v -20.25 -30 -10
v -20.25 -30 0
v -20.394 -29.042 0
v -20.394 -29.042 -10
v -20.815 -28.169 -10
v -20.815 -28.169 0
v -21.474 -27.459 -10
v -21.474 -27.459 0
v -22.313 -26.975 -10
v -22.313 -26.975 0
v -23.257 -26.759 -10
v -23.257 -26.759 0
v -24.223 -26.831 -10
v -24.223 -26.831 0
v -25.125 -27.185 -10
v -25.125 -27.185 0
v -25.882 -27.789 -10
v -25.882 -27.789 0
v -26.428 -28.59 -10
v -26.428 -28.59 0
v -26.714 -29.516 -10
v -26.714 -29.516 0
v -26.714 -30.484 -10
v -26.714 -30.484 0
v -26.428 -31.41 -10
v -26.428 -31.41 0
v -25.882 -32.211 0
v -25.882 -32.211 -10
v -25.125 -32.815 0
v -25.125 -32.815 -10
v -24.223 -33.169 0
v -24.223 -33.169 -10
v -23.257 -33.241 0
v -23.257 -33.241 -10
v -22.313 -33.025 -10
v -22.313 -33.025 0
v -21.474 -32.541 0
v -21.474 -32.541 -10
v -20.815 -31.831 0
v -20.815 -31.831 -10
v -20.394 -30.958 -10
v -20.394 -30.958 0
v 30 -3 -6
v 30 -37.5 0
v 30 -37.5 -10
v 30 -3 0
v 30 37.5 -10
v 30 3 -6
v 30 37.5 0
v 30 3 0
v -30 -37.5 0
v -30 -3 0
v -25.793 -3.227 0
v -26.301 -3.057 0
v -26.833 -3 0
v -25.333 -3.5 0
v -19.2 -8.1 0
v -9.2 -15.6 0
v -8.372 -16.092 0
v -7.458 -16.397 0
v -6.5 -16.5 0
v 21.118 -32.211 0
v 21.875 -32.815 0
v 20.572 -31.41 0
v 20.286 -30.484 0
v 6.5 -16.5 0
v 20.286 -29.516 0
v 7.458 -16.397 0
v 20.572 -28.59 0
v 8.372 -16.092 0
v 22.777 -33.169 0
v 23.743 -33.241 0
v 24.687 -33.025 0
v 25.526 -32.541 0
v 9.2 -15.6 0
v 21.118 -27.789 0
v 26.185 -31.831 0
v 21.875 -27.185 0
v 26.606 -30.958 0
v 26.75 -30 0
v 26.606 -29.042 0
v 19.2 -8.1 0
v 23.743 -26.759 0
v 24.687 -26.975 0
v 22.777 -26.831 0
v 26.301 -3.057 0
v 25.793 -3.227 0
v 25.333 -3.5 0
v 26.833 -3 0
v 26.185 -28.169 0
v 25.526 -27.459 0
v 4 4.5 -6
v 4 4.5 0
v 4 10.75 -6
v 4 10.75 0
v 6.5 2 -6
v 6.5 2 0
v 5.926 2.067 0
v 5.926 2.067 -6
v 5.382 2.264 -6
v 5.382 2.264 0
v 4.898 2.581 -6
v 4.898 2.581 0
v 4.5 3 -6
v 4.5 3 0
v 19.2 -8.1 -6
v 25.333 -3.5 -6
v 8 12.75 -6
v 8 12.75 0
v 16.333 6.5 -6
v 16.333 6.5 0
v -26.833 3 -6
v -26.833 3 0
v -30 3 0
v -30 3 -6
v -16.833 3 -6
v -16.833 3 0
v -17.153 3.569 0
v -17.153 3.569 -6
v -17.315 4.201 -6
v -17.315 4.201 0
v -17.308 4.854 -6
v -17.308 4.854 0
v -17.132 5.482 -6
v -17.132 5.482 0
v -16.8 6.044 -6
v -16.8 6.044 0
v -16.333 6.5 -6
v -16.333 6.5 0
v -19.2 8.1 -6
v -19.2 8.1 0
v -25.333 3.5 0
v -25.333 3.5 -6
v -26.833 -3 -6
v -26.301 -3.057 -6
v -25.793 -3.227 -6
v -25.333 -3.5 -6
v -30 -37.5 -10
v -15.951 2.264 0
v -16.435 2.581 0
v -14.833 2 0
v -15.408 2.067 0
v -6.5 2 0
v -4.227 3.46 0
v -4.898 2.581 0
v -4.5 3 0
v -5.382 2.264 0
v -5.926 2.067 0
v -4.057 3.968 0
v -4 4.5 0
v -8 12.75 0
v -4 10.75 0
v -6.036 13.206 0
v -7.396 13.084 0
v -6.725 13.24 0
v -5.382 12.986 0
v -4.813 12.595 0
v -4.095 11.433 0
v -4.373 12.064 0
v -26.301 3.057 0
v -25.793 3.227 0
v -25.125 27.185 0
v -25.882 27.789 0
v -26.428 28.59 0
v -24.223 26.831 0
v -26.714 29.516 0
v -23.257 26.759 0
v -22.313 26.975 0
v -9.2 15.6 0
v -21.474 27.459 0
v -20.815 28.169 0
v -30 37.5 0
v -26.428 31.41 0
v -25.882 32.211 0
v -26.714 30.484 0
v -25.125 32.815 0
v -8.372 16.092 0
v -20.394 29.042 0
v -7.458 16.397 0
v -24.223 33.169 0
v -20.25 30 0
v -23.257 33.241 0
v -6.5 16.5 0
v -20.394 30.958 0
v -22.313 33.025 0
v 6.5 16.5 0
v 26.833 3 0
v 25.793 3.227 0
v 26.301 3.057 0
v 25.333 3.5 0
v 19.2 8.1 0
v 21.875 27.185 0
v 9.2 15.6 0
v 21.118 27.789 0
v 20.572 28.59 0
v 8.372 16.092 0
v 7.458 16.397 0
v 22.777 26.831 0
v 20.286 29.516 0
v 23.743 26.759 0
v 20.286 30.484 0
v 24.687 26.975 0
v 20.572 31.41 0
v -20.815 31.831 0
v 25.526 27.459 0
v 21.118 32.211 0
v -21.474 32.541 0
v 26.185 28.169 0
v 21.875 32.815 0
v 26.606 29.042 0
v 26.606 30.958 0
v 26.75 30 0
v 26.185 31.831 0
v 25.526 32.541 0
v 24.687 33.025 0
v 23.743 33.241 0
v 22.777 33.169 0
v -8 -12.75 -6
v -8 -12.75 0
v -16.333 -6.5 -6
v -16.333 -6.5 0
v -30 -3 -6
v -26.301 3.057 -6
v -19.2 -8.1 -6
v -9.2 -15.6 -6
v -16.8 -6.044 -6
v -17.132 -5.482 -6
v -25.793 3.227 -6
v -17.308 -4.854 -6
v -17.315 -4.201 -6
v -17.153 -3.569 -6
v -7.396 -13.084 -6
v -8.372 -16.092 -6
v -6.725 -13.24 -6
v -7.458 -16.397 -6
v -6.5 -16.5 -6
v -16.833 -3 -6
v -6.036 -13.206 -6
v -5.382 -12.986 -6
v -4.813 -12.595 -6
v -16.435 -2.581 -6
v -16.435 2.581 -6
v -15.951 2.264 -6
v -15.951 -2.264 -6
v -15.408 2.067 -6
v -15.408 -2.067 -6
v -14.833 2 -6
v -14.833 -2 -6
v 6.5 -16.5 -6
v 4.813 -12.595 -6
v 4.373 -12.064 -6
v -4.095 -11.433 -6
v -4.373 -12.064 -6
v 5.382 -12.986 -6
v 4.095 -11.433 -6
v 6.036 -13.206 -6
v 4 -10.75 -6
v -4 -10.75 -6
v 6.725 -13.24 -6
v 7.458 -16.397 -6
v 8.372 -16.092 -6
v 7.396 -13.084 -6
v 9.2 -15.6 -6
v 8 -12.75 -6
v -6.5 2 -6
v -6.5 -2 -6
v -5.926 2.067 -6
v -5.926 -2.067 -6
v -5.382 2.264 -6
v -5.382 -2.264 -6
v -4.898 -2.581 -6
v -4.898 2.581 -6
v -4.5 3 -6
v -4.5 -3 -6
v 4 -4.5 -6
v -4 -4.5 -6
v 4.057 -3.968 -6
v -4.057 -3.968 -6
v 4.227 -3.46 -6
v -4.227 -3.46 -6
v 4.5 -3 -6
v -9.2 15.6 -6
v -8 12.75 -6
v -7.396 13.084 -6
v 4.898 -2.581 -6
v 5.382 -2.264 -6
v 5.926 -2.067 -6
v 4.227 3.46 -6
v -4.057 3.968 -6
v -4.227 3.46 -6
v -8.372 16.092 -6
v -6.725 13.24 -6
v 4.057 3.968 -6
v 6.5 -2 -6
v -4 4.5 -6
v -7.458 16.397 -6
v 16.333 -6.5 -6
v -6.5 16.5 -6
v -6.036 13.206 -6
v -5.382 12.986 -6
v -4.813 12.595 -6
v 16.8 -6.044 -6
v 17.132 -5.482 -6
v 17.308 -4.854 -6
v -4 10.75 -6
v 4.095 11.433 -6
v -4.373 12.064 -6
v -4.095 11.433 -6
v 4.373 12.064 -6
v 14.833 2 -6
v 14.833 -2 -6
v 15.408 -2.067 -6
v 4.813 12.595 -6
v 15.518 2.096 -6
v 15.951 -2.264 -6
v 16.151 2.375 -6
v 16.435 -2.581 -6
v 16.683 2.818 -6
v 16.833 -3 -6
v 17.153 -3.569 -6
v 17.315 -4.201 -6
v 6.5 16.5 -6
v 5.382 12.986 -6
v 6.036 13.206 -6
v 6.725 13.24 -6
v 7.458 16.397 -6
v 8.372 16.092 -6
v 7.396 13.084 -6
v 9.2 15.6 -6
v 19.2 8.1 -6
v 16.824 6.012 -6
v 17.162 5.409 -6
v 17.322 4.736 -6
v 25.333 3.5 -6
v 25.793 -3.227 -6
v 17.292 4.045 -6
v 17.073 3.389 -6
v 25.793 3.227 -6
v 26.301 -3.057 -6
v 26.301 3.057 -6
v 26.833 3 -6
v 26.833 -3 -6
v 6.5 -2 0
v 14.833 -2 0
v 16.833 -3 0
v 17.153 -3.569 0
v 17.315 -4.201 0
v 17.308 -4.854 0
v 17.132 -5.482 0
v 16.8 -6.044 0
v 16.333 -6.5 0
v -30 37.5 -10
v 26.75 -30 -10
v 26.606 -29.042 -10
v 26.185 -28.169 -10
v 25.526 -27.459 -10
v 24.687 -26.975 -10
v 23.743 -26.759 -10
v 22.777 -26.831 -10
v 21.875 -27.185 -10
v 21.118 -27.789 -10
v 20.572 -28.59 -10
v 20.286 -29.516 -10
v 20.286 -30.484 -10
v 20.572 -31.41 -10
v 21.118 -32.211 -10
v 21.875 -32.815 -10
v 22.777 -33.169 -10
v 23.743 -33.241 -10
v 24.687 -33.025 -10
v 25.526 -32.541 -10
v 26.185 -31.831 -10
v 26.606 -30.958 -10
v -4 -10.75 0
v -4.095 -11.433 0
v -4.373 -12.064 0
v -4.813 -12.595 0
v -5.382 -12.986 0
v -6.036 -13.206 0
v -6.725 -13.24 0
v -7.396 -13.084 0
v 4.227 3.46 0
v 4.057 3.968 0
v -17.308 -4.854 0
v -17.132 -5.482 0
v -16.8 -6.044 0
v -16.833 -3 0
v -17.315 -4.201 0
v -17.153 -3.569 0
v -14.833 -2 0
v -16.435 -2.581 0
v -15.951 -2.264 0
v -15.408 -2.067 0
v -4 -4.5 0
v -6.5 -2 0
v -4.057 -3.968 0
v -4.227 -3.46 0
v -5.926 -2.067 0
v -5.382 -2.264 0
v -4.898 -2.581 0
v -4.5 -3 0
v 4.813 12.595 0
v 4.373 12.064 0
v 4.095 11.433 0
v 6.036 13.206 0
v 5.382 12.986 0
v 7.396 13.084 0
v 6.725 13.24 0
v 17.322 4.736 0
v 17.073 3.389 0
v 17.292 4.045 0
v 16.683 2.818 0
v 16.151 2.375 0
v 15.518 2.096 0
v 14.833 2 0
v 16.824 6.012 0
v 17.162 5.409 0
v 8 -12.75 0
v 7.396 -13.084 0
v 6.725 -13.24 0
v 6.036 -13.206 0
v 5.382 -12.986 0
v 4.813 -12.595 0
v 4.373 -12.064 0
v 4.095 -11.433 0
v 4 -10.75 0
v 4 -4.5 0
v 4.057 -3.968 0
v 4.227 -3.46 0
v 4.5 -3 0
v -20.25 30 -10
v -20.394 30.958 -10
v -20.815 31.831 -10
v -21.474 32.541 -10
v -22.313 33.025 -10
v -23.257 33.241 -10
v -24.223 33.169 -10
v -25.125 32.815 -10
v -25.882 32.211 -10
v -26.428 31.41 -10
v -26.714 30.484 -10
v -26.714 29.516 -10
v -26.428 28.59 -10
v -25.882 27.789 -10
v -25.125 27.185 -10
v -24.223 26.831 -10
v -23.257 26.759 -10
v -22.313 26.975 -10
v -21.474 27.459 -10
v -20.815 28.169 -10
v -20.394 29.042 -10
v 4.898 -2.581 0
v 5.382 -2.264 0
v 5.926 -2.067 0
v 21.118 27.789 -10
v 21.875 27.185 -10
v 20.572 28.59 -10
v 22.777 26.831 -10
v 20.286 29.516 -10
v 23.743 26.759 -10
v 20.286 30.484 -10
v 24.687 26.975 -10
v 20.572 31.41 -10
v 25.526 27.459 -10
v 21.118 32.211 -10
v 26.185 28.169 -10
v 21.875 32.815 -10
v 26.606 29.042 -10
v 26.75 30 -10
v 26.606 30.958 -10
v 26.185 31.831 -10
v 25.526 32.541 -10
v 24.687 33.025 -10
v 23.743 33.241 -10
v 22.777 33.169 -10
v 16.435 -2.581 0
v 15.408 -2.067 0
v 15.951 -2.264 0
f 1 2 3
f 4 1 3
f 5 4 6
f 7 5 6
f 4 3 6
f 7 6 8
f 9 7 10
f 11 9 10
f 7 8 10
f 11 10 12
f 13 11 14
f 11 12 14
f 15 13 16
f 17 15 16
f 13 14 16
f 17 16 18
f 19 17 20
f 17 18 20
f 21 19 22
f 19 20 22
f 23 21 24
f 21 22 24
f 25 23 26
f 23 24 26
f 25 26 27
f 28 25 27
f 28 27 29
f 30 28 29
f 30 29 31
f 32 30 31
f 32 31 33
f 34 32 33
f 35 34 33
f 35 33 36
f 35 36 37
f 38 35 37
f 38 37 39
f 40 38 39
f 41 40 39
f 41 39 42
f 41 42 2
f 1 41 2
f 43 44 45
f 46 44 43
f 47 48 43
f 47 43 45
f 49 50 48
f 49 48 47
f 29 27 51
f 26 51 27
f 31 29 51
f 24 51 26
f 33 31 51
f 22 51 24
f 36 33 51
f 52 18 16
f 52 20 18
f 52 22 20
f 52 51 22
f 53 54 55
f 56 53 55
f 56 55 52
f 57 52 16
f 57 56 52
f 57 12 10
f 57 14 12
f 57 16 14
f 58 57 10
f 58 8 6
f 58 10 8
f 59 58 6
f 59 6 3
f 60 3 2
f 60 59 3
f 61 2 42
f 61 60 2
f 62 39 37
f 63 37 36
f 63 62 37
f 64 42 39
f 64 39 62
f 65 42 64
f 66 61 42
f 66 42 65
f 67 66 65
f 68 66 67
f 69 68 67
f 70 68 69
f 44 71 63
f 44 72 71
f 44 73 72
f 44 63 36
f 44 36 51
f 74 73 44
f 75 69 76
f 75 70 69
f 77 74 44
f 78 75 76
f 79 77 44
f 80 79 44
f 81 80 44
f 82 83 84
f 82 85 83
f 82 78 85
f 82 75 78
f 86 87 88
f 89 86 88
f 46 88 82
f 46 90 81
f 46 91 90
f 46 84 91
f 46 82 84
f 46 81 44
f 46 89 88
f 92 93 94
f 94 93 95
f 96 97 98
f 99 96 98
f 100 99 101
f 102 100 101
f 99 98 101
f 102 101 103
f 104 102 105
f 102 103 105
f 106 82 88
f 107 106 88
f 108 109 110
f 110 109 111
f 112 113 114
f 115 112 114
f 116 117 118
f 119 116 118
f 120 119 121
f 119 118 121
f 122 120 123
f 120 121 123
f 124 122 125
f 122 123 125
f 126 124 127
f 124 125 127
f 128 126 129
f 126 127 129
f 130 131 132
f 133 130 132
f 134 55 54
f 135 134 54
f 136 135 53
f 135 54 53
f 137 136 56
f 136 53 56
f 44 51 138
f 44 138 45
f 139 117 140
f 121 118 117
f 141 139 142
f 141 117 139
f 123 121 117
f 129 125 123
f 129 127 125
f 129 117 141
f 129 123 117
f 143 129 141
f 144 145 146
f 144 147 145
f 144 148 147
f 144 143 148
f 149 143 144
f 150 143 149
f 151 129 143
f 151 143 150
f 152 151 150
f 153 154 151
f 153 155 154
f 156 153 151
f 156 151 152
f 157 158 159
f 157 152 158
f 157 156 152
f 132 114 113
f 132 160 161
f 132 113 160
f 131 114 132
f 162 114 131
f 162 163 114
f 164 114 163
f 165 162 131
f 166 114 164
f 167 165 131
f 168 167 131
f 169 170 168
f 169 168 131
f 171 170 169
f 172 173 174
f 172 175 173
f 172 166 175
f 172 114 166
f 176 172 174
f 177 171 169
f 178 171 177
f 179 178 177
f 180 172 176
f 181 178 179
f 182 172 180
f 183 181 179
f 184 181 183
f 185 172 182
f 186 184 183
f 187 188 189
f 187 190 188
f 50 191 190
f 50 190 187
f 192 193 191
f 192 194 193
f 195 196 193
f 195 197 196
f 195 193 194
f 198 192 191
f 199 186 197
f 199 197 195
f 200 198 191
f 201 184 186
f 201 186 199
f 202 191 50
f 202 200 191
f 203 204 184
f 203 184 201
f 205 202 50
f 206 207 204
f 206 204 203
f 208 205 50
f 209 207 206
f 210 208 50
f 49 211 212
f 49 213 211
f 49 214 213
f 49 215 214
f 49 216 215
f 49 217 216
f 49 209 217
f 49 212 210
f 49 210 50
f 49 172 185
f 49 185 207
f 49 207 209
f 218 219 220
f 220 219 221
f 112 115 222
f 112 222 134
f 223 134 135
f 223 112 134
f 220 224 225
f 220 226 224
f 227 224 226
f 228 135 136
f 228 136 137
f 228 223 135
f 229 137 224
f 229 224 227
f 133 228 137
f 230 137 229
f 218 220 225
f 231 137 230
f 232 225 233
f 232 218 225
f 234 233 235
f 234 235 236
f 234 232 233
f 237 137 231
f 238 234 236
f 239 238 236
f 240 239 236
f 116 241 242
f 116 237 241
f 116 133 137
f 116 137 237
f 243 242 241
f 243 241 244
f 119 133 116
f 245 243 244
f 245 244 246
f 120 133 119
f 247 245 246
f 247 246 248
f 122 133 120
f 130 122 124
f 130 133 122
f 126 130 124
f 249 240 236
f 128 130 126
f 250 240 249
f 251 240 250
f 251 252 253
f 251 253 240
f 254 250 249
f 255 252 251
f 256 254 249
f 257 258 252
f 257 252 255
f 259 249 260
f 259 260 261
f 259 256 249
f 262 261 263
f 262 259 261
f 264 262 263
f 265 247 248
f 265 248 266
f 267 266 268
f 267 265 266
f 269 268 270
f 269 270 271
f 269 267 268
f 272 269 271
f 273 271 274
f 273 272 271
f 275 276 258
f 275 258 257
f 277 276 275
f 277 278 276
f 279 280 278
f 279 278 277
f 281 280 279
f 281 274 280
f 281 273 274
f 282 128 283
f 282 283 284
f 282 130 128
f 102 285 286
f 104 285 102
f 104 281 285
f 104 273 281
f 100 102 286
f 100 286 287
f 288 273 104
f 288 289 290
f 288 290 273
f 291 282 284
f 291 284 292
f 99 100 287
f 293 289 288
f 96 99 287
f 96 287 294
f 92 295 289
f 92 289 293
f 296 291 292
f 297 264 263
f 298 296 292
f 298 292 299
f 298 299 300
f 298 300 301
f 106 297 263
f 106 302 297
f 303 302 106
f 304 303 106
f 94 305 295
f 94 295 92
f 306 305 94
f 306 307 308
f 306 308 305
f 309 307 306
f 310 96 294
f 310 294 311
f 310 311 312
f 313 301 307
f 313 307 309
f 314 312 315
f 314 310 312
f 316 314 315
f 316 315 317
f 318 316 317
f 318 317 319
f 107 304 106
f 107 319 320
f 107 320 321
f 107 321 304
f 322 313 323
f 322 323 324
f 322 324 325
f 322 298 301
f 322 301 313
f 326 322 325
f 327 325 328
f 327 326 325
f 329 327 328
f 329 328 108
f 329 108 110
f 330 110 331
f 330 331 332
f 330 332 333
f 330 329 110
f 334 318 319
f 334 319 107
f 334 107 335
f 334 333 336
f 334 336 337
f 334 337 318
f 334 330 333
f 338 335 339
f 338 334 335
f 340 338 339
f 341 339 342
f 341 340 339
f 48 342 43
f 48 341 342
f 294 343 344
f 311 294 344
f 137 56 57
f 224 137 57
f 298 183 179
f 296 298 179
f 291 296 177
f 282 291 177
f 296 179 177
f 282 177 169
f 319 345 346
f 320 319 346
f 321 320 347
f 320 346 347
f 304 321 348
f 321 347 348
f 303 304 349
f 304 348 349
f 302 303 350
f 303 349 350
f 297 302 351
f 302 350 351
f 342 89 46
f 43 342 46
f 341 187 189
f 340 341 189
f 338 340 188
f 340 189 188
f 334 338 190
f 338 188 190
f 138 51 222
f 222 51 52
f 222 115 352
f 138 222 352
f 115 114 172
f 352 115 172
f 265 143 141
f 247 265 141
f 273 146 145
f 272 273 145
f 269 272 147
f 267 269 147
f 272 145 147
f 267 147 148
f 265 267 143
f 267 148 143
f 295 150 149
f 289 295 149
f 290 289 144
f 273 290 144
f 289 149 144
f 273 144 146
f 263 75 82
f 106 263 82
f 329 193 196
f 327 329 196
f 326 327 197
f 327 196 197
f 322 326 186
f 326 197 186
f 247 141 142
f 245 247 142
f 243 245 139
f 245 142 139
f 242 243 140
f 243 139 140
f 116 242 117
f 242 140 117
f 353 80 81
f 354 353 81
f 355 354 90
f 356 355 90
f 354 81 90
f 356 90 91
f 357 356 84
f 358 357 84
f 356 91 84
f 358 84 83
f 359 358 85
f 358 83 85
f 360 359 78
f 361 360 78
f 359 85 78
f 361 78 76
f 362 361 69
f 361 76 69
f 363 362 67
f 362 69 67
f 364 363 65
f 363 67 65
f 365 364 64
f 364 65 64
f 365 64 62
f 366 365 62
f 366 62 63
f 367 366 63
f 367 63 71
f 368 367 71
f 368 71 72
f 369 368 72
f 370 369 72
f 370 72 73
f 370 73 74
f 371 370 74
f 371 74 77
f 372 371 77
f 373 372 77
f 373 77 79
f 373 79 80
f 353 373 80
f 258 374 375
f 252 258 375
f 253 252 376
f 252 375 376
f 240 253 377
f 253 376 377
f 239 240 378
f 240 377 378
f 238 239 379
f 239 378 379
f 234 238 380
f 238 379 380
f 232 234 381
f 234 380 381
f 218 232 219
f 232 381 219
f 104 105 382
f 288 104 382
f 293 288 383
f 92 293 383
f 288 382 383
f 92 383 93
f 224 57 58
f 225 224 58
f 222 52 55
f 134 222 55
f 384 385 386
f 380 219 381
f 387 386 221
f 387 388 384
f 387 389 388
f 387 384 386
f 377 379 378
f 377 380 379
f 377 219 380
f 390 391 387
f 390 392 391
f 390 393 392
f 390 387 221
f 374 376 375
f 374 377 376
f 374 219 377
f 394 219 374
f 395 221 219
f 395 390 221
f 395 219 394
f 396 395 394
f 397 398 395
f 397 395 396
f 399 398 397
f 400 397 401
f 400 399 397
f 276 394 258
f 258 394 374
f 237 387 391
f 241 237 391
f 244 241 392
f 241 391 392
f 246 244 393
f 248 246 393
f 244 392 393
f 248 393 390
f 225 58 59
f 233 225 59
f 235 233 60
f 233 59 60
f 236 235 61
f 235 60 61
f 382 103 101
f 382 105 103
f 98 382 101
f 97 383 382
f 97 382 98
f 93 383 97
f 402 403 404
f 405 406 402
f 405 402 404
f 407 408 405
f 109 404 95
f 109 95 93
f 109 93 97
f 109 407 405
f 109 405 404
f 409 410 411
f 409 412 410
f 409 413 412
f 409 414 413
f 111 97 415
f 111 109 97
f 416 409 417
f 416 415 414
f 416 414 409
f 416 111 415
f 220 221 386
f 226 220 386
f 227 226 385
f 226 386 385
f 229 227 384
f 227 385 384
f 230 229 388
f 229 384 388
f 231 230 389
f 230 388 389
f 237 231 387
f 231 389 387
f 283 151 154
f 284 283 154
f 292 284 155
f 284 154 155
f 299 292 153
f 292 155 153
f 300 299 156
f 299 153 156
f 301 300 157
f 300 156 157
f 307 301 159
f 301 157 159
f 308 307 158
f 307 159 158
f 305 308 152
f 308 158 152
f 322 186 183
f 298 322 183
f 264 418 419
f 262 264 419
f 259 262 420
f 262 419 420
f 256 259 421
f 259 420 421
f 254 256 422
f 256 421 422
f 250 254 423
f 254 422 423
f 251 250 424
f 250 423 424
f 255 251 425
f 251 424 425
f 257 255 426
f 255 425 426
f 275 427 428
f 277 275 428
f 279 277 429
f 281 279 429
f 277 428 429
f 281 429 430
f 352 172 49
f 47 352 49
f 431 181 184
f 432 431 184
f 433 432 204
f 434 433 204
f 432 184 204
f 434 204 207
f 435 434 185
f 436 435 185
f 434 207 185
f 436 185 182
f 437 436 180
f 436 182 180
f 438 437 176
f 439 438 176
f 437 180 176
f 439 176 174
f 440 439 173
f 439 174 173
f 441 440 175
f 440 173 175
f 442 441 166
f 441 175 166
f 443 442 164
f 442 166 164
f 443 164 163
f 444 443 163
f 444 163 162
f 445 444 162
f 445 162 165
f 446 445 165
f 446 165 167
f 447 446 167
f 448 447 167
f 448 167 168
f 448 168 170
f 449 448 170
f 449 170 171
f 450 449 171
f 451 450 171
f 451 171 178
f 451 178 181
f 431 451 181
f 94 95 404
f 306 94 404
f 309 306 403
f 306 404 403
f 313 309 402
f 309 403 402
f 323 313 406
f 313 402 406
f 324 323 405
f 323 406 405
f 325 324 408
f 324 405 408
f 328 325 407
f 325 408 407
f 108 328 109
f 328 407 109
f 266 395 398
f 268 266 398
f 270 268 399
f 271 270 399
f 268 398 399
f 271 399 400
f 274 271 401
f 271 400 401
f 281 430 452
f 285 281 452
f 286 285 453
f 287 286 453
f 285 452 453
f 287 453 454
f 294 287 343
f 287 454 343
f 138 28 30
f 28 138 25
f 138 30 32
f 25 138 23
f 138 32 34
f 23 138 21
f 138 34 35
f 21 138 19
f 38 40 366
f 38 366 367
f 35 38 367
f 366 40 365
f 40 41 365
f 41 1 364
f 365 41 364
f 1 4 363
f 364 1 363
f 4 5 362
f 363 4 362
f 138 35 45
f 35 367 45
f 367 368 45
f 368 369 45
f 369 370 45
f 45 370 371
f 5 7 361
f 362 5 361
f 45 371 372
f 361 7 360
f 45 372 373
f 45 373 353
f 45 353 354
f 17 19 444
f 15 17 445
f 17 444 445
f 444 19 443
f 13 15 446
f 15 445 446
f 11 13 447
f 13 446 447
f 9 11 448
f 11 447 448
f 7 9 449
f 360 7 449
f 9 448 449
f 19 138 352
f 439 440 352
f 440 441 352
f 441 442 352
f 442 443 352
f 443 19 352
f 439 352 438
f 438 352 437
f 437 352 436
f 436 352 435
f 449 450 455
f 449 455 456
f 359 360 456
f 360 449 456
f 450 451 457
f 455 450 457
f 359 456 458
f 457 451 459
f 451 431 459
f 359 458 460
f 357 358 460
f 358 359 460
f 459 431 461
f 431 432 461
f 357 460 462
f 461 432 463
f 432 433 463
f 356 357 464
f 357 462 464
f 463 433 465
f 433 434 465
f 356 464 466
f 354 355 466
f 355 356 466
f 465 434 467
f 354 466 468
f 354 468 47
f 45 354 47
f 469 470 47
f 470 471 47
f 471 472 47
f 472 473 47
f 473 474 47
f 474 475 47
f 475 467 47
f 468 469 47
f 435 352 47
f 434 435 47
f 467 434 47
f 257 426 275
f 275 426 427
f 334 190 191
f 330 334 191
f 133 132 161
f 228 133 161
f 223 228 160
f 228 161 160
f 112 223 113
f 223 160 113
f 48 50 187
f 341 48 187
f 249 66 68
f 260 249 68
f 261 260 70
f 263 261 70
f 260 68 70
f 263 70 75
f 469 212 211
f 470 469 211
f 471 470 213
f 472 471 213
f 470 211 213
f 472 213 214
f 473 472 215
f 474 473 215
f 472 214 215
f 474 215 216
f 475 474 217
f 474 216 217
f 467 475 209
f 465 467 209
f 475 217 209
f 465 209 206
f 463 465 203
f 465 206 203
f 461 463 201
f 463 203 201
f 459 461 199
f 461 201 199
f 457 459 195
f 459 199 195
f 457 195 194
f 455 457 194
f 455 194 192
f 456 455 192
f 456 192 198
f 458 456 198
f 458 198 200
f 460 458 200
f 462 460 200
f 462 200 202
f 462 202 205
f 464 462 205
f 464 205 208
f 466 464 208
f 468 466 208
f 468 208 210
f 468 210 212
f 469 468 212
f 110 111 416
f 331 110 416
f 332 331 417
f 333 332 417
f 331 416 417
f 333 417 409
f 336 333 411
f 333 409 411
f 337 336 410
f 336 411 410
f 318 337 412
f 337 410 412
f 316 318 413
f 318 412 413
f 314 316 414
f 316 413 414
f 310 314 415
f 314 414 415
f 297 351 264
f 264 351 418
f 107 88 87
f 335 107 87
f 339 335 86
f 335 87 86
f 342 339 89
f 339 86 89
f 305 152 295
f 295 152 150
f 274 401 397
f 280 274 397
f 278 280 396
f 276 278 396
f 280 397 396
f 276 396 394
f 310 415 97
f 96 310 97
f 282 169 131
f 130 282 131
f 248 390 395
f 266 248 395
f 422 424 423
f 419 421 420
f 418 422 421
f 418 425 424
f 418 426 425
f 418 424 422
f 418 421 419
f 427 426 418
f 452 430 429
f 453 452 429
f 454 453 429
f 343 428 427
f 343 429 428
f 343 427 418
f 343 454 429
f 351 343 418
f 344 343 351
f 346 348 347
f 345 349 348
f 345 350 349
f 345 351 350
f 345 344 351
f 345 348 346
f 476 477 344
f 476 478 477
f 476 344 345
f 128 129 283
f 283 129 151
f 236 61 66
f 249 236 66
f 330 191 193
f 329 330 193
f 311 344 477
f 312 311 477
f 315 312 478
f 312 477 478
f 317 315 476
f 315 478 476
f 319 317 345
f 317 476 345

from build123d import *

# Parameters (mm, degrees)
F0_W     = 60
F0_H     = 75
F1_DEPTH = 10
F2_R     = 3.25
F3_DEPTH = 10.001
F5_DEPTH = 6


with BuildPart() as f1:
    # F0 (on Top) → F1 (new body)
    with BuildSketch(Plane.XY):
        Rectangle(F0_W, F0_H)
    extrude(amount=-F1_DEPTH)

    # F2 (on Top) → F3 (cut, through all)
    with BuildSketch(Plane.XY):
        with Locations((-23.5, 30)):
            Circle(F2_R)
        with Locations((23.5, 30)):
            Circle(F2_R)
        with Locations((-23.5, -30)):
            Circle(F2_R)
        with Locations((23.5, -30)):
            Circle(F2_R)
    extrude(amount=-F3_DEPTH, mode=Mode.SUBTRACT)

    # F4 (on face) → F5 (cut)
    with BuildSketch(Plane.XY):
        with BuildLine():
            Line((-30, 3), (-30, 0))
            Line((-30, 0), (-30, -3))
            Line((-30, -3), (-26.833333, -3))
            Line((-26.833333, -3), (-26, -3))
            Line((-26, -3), (-16.833333, -3))
            ThreePointArc((-16.833333, -3), (-15.951367, -2.263932), (-14.833333, -2))
            Line((-14.833333, -2), (-6.5, -2))
            ThreePointArc((-6.5, -2), (-5.381966, -2.263932), (-4.5, -3))
            Line((-4.5, -3), (-2.257359, -3))
            Line((-2.257359, -3), (2.257359, -3))
            Line((2.257359, -3), (4.5, -3))
            ThreePointArc((4.5, -3), (5.381966, -2.263932), (6.5, -2))
            Line((6.5, -2), (14.833333, -2))
            ThreePointArc((14.833333, -2), (15.951367, -2.263932), (16.833333, -3))
            Line((16.833333, -3), (26, -3))
            Line((26, -3), (26.833333, -3))
            Line((26.833333, -3), (30, -3))
            Line((30, -3), (30, 0))
            Line((30, 0), (30, 3))
            Line((30, 3), (26.833333, 3))
            Line((26.833333, 3), (26, 3))
            Line((26, 3), (25.333333, 3.5))
            Line((25.333333, 3.5), (19.2, 8.1))
            Line((19.2, 8.1), (9.2, 15.6))
            ThreePointArc((9.2, 15.6), (7.923025, 16.269075), (6.5, 16.5))
            Line((6.5, 16.5), (0, 16.5))
            Line((0, 16.5), (-6.5, 16.5))
            ThreePointArc((-6.5, 16.5), (-7.923025, 16.269075), (-9.2, 15.6))
            Line((-9.2, 15.6), (-19.2, 8.1))
            Line((-19.2, 8.1), (-25.333333, 3.5))
            Line((-25.333333, 3.5), (-26, 3))
            Line((-26, 3), (-26.833333, 3))
            Line((-26.833333, 3), (-30, 3))
        make_face()
        with BuildLine():
            ThreePointArc((-14.833333, 2), (-15.951367, 2.263932), (-16.833333, 3))
            ThreePointArc((-16.833333, 3), (-17.308207, 4.853553), (-16.333333, 6.5))
            Line((-16.333333, 6.5), (-8, 12.75))
            ThreePointArc((-8, 12.75), (-5.381966, 12.986068), (-4, 10.75))
            Line((-4, 10.75), (-4, 4.5))
            ThreePointArc((-4, 4.5), (-4.128292, 3.709431), (-4.5, 3))
            ThreePointArc((-4.5, 3), (-5.381966, 2.263932), (-6.5, 2))
            Line((-6.5, 2), (-14.833333, 2))
        make_face(mode=Mode.SUBTRACT)
        with BuildLine():
            ThreePointArc((6.5, 2), (5.381966, 2.263932), (4.5, 3))
            ThreePointArc((4.5, 3), (4.128292, 3.709431), (4, 4.5))
            Line((4, 4.5), (4, 10.75))
            ThreePointArc((4, 10.75), (5.381966, 12.986068), (8, 12.75))
            Line((8, 12.75), (16.333333, 6.5))
            ThreePointArc((16.333333, 6.5), (17.205042, 3.709431), (14.833333, 2))
            Line((14.833333, 2), (6.5, 2))
        make_face(mode=Mode.SUBTRACT)
        with BuildLine():
            ThreePointArc((-25.333333, 3.5), (-26.042764, 3.128292), (-26.833333, 3))
            Line((-26.833333, 3), (-26, 3))
            Line((-26, 3), (-25.333333, 3.5))
        make_face()
        with BuildLine():
            Line((-26, -3), (-26.833333, -3))
            ThreePointArc((-26.833333, -3), (-26.042764, -3.128292), (-25.333333, -3.5))
            Line((-25.333333, -3.5), (-26, -3))
        make_face()
        with BuildLine():
            Line((-16.833333, -3), (-26, -3))
            Line((-26, -3), (-25.333333, -3.5))
            Line((-25.333333, -3.5), (-19.2, -8.1))
            Line((-19.2, -8.1), (-9.2, -15.6))
            ThreePointArc((-9.2, -15.6), (-7.923025, -16.269075), (-6.5, -16.5))
            Line((-6.5, -16.5), (0, -16.5))
            Line((0, -16.5), (6.5, -16.5))
            ThreePointArc((6.5, -16.5), (7.923025, -16.269075), (9.2, -15.6))
            Line((9.2, -15.6), (19.2, -8.1))
            Line((19.2, -8.1), (25.333333, -3.5))
            Line((25.333333, -3.5), (26, -3))
            Line((26, -3), (16.833333, -3))
            ThreePointArc((16.833333, -3), (17.308207, -4.853553), (16.333333, -6.5))
            Line((16.333333, -6.5), (8, -12.75))
            ThreePointArc((8, -12.75), (5.381966, -12.986068), (4, -10.75))
            Line((4, -10.75), (4, -4.5))
            ThreePointArc((4, -4.5), (4.128292, -3.709431), (4.5, -3))
            Line((4.5, -3), (2.257359, -3))
            Line((2.257359, -3), (-2.257359, -3))
            Line((-2.257359, -3), (-4.5, -3))
            ThreePointArc((-4.5, -3), (-4.128292, -3.709431), (-4, -4.5))
            Line((-4, -4.5), (-4, -10.75))
            ThreePointArc((-4, -10.75), (-5.381966, -12.986068), (-8, -12.75))
            Line((-8, -12.75), (-16.333333, -6.5))
            ThreePointArc((-16.333333, -6.5), (-17.308207, -4.853553), (-16.833333, -3))
        make_face()
        with BuildLine():
            Line((26.833333, -3), (26, -3))
            Line((26, -3), (25.333333, -3.5))
            ThreePointArc((25.333333, -3.5), (26.042764, -3.128292), (26.833333, -3))
        make_face()
        with BuildLine():
            ThreePointArc((26.833333, 3), (26.042764, 3.128292), (25.333333, 3.5))
            Line((25.333333, 3.5), (26, 3))
            Line((26, 3), (26.833333, 3))
        make_face()
    extrude(amount=-F5_DEPTH, mode=Mode.SUBTRACT)


solid = f1.part
